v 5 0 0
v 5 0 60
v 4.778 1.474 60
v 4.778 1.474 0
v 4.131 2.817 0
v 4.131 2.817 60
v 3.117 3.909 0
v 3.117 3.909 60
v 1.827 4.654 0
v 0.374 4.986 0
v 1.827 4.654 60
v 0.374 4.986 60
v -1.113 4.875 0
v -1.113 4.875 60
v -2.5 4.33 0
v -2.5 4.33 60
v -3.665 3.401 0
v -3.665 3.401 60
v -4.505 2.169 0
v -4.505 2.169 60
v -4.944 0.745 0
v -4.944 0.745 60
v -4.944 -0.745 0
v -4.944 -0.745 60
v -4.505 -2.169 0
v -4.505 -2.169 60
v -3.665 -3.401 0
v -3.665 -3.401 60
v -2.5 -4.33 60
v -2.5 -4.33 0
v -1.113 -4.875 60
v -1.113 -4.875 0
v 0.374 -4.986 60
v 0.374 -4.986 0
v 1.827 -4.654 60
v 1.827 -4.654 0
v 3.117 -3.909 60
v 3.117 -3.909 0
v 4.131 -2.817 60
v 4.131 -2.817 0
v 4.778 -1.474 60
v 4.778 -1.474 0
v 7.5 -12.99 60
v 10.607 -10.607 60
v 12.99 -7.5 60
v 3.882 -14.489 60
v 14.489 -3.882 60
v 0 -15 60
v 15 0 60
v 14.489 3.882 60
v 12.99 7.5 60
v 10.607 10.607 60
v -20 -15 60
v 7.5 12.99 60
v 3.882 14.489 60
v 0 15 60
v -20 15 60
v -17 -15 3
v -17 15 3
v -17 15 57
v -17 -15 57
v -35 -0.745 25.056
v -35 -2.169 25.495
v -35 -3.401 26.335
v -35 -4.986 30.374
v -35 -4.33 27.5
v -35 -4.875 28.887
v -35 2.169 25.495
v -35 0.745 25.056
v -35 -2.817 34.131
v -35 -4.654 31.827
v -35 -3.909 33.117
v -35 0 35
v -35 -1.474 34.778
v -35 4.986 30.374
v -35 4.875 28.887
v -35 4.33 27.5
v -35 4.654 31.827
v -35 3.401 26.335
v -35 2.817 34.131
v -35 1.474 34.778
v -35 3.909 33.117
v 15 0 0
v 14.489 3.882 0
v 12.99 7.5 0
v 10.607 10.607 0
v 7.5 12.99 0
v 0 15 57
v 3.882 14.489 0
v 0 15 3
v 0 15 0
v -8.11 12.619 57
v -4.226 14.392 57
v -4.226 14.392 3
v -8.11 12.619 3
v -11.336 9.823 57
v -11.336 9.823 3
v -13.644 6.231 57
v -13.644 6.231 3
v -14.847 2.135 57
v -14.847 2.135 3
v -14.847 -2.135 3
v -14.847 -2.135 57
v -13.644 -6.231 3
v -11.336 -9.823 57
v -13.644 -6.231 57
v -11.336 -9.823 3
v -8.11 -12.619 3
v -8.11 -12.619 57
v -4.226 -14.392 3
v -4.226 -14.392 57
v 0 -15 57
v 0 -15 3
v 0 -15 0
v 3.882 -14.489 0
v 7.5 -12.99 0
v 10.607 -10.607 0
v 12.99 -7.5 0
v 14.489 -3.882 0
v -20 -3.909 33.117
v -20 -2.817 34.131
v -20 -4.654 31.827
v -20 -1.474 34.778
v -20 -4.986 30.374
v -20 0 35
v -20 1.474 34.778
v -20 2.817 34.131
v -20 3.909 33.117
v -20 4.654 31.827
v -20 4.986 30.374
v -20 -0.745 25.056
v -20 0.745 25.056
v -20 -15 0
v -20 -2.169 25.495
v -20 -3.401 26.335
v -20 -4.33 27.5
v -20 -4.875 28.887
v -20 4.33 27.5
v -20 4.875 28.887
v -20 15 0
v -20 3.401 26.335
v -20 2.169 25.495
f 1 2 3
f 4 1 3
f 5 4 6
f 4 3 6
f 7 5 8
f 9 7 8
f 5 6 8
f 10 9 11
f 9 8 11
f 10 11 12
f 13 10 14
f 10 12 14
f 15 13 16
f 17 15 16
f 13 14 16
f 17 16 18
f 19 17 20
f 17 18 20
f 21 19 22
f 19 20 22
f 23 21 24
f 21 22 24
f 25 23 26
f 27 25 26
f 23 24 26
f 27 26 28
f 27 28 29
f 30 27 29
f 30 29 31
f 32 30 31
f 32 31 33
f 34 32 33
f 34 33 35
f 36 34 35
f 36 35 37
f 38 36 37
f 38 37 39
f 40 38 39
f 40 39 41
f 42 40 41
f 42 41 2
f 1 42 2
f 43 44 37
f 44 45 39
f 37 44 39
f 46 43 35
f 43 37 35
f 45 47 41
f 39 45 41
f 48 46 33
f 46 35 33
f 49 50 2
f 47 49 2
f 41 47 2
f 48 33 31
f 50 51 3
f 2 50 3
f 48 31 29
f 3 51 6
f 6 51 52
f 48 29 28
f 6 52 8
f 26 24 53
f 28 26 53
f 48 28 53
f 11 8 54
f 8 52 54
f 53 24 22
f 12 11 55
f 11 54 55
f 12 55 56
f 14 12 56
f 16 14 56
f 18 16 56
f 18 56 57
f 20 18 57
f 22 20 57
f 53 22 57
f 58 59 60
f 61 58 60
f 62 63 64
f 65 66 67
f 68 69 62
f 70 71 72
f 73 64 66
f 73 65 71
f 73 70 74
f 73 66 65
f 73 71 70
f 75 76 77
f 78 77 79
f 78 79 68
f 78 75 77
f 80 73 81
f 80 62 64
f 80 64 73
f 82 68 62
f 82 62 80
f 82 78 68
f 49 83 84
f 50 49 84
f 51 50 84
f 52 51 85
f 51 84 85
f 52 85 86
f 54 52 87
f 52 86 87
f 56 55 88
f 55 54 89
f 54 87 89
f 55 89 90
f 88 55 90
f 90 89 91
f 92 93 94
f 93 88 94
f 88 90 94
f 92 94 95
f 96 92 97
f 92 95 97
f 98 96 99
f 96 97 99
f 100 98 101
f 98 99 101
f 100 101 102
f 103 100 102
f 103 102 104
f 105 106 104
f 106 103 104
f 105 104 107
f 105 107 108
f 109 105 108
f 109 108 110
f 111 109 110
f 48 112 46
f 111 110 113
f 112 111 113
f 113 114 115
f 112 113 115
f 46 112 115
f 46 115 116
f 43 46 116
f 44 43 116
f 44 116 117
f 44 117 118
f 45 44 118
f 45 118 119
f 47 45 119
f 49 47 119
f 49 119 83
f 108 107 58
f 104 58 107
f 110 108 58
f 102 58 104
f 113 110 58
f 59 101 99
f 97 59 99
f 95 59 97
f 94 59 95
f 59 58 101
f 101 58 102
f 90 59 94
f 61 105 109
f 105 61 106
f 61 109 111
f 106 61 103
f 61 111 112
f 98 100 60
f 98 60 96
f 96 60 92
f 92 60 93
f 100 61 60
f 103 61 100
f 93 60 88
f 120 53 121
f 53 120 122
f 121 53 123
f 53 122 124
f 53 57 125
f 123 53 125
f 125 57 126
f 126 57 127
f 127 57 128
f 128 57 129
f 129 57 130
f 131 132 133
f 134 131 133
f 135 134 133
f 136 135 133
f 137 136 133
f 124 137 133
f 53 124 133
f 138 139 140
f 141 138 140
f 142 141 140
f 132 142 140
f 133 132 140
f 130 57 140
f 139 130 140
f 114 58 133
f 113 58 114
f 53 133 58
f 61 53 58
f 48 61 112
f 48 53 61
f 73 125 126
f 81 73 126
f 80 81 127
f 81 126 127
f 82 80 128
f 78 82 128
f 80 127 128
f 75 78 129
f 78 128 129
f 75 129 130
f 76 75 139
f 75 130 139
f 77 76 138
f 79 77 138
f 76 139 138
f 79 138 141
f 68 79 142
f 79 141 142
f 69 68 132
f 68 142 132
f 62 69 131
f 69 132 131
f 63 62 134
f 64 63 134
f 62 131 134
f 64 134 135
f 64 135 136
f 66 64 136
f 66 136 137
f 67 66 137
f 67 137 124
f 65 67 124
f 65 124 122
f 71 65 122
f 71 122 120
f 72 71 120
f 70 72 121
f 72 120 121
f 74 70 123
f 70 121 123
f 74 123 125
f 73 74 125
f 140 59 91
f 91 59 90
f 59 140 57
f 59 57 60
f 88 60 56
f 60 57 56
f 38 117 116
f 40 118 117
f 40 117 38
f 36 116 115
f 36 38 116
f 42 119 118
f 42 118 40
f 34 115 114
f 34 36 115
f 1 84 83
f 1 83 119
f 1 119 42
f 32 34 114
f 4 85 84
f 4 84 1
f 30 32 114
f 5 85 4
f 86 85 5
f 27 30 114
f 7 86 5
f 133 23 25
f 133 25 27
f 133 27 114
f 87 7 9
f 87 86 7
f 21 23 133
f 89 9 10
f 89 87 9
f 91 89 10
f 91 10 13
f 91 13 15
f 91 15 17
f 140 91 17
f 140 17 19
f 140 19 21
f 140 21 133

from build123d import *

# Parameters (mm, degrees)
SKETCH1_R           = 15
BOSS_EXTRUDE1_DEPTH = 60
BOSS_EXTRUDE2_DEPTH = 15
SKETCH3_R           = 5
BOSS_EXTRUDE3_DEPTH = 15
SKETCH4_R           = 5
CUT_EXTRUDE1_DEPTH  = 146


with BuildPart() as part:
    # Sketch1 → Boss-Extrude1 (new body)
    with BuildSketch(Plane.XY):
        Circle(SKETCH1_R)
    extrude(amount=BOSS_EXTRUDE1_DEPTH)

    # Sketch2 → Boss-Extrude2 (add, symmetric)
    with BuildSketch(Plane(origin=(0, 0, 0), x_dir=(1, 0, 0), z_dir=(0, 1, 0))):
        Polygon((0, 0), (-20, 0), (-20, -30), (-17, -30), (-17, -3), (0, -3), align=None)
    boss_extrude2 = extrude(amount=BOSS_EXTRUDE2_DEPTH, both=True)

    # Mirror1: Boss-Extrude2 across plane
    add(boss_extrude2.mirror(Plane(origin=(-17, -15, 30), x_dir=(1, 0, 0), z_dir=(0, 0, 1))))

    # Sketch3 → Boss-Extrude3 (add)
    with BuildSketch(Plane.ZY.offset(20)):
        with Locations((30, 0)):
            Circle(SKETCH3_R)
    extrude(amount=BOSS_EXTRUDE3_DEPTH)

    # Sketch4 → Cut-Extrude1 (cut)
    with BuildSketch(Plane.XY.offset(60)):
        Circle(SKETCH4_R)
    extrude(amount=-CUT_EXTRUDE1_DEPTH, mode=Mode.SUBTRACT)


solid = part.part
